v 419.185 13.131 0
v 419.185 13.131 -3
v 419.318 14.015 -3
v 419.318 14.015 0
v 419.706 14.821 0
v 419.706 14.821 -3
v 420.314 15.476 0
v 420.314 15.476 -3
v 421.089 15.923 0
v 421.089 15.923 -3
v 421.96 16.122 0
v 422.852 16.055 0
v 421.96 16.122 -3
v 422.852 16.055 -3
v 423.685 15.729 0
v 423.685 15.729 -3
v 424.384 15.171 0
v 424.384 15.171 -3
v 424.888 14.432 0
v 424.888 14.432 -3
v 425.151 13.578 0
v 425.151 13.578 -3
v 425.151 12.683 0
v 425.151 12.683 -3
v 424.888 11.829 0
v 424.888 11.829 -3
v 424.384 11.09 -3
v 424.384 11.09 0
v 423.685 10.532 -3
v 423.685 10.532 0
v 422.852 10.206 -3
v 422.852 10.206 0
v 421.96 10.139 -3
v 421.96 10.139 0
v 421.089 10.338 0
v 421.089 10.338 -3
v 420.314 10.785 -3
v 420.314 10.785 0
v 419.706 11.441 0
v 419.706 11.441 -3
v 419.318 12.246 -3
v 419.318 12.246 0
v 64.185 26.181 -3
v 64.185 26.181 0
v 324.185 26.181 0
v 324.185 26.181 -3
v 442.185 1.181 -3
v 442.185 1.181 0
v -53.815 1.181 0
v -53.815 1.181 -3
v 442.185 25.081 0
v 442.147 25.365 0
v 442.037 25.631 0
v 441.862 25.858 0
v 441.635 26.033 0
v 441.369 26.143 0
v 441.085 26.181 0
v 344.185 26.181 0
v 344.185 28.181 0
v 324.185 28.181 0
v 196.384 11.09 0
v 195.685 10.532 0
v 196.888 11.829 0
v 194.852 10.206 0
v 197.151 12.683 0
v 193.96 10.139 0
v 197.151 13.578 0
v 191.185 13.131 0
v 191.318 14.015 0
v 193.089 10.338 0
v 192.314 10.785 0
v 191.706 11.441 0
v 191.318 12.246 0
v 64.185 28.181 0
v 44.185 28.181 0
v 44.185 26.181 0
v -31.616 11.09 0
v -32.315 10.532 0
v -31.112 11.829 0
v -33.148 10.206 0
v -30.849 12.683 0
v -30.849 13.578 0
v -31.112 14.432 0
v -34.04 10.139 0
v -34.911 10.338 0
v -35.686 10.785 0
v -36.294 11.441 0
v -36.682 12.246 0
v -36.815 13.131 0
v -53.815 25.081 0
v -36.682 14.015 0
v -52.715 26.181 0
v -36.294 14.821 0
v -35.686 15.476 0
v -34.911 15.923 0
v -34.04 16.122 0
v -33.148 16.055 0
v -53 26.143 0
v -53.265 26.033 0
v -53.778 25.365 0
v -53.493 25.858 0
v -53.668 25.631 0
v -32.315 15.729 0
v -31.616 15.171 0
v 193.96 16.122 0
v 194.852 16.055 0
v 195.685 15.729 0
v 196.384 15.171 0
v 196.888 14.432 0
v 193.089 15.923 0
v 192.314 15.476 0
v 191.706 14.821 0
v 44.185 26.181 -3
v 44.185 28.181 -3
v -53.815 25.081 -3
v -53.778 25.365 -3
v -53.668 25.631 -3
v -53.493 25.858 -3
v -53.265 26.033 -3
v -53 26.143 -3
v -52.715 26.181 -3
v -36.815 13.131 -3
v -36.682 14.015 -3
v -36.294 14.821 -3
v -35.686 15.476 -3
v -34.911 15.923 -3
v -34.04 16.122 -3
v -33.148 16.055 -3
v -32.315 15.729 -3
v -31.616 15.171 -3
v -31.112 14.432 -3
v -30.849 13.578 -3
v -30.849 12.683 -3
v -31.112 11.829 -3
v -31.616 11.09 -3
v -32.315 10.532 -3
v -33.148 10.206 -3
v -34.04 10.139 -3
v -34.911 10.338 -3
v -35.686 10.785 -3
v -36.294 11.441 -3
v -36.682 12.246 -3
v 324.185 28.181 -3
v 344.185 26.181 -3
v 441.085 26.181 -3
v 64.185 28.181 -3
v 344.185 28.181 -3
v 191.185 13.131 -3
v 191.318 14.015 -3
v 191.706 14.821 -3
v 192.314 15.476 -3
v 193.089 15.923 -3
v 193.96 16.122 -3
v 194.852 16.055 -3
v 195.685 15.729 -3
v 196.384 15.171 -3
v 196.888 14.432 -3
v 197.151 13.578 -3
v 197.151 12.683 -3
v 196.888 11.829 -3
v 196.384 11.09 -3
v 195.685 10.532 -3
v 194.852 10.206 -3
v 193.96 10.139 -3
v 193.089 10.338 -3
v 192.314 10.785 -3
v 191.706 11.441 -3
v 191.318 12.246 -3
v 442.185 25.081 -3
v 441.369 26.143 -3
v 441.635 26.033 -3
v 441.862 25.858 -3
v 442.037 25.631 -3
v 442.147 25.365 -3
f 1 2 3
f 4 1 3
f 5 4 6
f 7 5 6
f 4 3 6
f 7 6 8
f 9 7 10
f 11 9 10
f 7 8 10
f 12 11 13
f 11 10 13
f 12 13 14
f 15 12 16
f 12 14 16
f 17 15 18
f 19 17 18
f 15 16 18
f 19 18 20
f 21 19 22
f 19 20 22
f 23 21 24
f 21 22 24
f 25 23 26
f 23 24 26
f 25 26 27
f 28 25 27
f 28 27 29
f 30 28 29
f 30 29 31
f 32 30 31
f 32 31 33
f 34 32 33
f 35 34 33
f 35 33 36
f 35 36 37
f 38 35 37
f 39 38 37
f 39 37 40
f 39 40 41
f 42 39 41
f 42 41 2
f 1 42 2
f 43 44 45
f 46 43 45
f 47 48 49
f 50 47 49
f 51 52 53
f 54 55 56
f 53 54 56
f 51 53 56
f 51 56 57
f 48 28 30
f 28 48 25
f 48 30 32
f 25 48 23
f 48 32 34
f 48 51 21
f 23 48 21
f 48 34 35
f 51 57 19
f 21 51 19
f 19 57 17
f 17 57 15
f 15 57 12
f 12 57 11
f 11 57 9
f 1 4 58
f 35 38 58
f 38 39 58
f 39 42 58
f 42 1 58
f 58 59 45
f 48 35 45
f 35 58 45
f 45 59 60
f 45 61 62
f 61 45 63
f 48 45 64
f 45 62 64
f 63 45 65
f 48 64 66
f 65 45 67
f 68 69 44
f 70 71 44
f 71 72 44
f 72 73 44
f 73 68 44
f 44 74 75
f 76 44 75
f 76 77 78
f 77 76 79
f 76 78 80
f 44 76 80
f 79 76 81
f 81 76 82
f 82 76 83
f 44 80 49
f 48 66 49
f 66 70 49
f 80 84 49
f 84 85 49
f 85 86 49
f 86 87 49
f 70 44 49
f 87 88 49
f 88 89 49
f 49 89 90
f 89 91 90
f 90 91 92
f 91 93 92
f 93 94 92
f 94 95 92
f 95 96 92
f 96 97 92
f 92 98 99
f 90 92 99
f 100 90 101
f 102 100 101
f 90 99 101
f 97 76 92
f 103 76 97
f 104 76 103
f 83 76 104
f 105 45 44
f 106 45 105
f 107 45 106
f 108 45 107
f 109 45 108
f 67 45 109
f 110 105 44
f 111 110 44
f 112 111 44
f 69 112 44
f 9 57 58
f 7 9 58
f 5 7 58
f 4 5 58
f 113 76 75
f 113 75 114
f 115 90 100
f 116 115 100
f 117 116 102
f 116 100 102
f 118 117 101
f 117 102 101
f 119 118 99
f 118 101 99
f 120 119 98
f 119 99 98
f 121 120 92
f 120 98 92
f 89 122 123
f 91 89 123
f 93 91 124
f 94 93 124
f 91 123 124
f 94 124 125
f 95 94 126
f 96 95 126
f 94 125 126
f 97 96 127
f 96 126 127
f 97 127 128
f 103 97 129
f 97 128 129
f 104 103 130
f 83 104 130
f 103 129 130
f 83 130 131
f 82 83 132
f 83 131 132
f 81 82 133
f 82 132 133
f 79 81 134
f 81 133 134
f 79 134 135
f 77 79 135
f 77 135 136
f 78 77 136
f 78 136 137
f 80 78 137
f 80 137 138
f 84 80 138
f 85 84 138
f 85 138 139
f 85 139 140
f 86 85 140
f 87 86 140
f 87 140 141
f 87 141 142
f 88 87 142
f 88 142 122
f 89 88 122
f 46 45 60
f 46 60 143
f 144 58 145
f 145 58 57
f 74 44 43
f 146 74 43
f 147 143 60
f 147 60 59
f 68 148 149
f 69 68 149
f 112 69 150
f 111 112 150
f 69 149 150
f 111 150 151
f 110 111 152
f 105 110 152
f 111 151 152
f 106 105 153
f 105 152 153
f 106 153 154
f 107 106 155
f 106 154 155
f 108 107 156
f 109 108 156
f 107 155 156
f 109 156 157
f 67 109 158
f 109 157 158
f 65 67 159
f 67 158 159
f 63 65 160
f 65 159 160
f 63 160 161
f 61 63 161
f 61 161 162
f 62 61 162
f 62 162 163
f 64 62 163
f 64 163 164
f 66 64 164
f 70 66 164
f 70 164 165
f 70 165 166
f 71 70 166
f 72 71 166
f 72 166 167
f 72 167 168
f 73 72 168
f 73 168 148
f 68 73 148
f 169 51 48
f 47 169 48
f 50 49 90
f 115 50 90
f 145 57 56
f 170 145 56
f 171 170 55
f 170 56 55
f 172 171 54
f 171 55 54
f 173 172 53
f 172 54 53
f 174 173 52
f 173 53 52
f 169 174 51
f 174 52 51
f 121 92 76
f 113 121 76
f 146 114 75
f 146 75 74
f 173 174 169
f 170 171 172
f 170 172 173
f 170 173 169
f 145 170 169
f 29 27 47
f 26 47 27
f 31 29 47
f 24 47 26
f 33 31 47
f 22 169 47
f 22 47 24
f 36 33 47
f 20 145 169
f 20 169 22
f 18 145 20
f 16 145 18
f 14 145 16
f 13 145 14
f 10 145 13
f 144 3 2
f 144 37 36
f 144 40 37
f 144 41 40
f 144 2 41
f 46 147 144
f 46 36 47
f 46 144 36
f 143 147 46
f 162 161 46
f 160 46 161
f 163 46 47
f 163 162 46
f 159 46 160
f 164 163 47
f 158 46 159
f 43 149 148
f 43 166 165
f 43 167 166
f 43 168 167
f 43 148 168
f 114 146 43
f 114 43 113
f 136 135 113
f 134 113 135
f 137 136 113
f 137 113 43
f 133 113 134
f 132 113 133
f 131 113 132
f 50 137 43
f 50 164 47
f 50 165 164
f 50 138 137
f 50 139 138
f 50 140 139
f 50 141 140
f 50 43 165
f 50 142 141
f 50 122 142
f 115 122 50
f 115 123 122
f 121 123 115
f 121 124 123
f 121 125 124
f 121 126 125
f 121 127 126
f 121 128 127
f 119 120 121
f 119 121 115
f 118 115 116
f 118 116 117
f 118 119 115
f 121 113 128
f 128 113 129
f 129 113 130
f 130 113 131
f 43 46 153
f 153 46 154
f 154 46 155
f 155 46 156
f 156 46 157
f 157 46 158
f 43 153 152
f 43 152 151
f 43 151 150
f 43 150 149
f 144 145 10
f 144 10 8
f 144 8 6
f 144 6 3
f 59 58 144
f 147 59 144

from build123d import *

# Parameters (mm, degrees)
SM_BASE_FLANGE_1_DEPTH = 3
SKETCH_4_W             = 20
SKETCH_4_H             = 3
EXTRUDE_1_DEPTH        = 2
SKETCH_5_R             = 3
CUT_EXTRUDE_1_DEPTH    = 10


# Sheet-metal steps are written as plain solids
with BuildPart() as part:
    # Sketch 1 → Базовая кромка1 (new body)
    with BuildSketch(Plane.XY):
        with BuildLine():
            Line((-52.715343227, 26.180564784), (441.084656773, 26.180564784))
            ThreePointArc((441.084656773, 26.180564784), (441.862474232, 25.858382243), (442.184656773, 25.080564784))
            Line((442.184656773, 25.080564784), (442.184656773, 1.180564784))
            Line((442.184656773, 1.180564784), (-53.815343227, 1.180564784))
            Line((-53.815343227, 1.180564784), (-53.815343227, 25.080564784))
            ThreePointArc((-53.815343227, 25.080564784), (-53.493160687, 25.858382243), (-52.715343227, 26.180564784))
        make_face()
    extrude(amount=-SM_BASE_FLANGE_1_DEPTH)

    # Эскиз4 → Бобышка-Вытянуть1 (add)
    with BuildSketch(Plane(origin=(0, 26.180564784, 0), x_dir=(1, 0, 0), z_dir=(0, 1, 0))):
        with Locations((54.184656773, 1.5)):
            Rectangle(SKETCH_4_W, SKETCH_4_H)
        with Locations((334.184656773, 1.5)):
            Rectangle(SKETCH_4_W, SKETCH_4_H)
    extrude(amount=EXTRUDE_1_DEPTH)

    # Эскиз5 → Вырез-Вытянуть1 (cut)
    with BuildSketch(Plane(origin=(0, 0, -3), x_dir=(-1, 0, 0), z_dir=(0, 0, -1))):
        with Locations((-422.184656773, 13.130564784)):
            Circle(SKETCH_5_R)
        with Locations((-194.184656773, 13.130564784)):
            Circle(SKETCH_5_R)
        with Locations((33.815343227, 13.130564784)):
            Circle(SKETCH_5_R)
    extrude(amount=-CUT_EXTRUDE_1_DEPTH, mode=Mode.SUBTRACT)


solid = part.part
